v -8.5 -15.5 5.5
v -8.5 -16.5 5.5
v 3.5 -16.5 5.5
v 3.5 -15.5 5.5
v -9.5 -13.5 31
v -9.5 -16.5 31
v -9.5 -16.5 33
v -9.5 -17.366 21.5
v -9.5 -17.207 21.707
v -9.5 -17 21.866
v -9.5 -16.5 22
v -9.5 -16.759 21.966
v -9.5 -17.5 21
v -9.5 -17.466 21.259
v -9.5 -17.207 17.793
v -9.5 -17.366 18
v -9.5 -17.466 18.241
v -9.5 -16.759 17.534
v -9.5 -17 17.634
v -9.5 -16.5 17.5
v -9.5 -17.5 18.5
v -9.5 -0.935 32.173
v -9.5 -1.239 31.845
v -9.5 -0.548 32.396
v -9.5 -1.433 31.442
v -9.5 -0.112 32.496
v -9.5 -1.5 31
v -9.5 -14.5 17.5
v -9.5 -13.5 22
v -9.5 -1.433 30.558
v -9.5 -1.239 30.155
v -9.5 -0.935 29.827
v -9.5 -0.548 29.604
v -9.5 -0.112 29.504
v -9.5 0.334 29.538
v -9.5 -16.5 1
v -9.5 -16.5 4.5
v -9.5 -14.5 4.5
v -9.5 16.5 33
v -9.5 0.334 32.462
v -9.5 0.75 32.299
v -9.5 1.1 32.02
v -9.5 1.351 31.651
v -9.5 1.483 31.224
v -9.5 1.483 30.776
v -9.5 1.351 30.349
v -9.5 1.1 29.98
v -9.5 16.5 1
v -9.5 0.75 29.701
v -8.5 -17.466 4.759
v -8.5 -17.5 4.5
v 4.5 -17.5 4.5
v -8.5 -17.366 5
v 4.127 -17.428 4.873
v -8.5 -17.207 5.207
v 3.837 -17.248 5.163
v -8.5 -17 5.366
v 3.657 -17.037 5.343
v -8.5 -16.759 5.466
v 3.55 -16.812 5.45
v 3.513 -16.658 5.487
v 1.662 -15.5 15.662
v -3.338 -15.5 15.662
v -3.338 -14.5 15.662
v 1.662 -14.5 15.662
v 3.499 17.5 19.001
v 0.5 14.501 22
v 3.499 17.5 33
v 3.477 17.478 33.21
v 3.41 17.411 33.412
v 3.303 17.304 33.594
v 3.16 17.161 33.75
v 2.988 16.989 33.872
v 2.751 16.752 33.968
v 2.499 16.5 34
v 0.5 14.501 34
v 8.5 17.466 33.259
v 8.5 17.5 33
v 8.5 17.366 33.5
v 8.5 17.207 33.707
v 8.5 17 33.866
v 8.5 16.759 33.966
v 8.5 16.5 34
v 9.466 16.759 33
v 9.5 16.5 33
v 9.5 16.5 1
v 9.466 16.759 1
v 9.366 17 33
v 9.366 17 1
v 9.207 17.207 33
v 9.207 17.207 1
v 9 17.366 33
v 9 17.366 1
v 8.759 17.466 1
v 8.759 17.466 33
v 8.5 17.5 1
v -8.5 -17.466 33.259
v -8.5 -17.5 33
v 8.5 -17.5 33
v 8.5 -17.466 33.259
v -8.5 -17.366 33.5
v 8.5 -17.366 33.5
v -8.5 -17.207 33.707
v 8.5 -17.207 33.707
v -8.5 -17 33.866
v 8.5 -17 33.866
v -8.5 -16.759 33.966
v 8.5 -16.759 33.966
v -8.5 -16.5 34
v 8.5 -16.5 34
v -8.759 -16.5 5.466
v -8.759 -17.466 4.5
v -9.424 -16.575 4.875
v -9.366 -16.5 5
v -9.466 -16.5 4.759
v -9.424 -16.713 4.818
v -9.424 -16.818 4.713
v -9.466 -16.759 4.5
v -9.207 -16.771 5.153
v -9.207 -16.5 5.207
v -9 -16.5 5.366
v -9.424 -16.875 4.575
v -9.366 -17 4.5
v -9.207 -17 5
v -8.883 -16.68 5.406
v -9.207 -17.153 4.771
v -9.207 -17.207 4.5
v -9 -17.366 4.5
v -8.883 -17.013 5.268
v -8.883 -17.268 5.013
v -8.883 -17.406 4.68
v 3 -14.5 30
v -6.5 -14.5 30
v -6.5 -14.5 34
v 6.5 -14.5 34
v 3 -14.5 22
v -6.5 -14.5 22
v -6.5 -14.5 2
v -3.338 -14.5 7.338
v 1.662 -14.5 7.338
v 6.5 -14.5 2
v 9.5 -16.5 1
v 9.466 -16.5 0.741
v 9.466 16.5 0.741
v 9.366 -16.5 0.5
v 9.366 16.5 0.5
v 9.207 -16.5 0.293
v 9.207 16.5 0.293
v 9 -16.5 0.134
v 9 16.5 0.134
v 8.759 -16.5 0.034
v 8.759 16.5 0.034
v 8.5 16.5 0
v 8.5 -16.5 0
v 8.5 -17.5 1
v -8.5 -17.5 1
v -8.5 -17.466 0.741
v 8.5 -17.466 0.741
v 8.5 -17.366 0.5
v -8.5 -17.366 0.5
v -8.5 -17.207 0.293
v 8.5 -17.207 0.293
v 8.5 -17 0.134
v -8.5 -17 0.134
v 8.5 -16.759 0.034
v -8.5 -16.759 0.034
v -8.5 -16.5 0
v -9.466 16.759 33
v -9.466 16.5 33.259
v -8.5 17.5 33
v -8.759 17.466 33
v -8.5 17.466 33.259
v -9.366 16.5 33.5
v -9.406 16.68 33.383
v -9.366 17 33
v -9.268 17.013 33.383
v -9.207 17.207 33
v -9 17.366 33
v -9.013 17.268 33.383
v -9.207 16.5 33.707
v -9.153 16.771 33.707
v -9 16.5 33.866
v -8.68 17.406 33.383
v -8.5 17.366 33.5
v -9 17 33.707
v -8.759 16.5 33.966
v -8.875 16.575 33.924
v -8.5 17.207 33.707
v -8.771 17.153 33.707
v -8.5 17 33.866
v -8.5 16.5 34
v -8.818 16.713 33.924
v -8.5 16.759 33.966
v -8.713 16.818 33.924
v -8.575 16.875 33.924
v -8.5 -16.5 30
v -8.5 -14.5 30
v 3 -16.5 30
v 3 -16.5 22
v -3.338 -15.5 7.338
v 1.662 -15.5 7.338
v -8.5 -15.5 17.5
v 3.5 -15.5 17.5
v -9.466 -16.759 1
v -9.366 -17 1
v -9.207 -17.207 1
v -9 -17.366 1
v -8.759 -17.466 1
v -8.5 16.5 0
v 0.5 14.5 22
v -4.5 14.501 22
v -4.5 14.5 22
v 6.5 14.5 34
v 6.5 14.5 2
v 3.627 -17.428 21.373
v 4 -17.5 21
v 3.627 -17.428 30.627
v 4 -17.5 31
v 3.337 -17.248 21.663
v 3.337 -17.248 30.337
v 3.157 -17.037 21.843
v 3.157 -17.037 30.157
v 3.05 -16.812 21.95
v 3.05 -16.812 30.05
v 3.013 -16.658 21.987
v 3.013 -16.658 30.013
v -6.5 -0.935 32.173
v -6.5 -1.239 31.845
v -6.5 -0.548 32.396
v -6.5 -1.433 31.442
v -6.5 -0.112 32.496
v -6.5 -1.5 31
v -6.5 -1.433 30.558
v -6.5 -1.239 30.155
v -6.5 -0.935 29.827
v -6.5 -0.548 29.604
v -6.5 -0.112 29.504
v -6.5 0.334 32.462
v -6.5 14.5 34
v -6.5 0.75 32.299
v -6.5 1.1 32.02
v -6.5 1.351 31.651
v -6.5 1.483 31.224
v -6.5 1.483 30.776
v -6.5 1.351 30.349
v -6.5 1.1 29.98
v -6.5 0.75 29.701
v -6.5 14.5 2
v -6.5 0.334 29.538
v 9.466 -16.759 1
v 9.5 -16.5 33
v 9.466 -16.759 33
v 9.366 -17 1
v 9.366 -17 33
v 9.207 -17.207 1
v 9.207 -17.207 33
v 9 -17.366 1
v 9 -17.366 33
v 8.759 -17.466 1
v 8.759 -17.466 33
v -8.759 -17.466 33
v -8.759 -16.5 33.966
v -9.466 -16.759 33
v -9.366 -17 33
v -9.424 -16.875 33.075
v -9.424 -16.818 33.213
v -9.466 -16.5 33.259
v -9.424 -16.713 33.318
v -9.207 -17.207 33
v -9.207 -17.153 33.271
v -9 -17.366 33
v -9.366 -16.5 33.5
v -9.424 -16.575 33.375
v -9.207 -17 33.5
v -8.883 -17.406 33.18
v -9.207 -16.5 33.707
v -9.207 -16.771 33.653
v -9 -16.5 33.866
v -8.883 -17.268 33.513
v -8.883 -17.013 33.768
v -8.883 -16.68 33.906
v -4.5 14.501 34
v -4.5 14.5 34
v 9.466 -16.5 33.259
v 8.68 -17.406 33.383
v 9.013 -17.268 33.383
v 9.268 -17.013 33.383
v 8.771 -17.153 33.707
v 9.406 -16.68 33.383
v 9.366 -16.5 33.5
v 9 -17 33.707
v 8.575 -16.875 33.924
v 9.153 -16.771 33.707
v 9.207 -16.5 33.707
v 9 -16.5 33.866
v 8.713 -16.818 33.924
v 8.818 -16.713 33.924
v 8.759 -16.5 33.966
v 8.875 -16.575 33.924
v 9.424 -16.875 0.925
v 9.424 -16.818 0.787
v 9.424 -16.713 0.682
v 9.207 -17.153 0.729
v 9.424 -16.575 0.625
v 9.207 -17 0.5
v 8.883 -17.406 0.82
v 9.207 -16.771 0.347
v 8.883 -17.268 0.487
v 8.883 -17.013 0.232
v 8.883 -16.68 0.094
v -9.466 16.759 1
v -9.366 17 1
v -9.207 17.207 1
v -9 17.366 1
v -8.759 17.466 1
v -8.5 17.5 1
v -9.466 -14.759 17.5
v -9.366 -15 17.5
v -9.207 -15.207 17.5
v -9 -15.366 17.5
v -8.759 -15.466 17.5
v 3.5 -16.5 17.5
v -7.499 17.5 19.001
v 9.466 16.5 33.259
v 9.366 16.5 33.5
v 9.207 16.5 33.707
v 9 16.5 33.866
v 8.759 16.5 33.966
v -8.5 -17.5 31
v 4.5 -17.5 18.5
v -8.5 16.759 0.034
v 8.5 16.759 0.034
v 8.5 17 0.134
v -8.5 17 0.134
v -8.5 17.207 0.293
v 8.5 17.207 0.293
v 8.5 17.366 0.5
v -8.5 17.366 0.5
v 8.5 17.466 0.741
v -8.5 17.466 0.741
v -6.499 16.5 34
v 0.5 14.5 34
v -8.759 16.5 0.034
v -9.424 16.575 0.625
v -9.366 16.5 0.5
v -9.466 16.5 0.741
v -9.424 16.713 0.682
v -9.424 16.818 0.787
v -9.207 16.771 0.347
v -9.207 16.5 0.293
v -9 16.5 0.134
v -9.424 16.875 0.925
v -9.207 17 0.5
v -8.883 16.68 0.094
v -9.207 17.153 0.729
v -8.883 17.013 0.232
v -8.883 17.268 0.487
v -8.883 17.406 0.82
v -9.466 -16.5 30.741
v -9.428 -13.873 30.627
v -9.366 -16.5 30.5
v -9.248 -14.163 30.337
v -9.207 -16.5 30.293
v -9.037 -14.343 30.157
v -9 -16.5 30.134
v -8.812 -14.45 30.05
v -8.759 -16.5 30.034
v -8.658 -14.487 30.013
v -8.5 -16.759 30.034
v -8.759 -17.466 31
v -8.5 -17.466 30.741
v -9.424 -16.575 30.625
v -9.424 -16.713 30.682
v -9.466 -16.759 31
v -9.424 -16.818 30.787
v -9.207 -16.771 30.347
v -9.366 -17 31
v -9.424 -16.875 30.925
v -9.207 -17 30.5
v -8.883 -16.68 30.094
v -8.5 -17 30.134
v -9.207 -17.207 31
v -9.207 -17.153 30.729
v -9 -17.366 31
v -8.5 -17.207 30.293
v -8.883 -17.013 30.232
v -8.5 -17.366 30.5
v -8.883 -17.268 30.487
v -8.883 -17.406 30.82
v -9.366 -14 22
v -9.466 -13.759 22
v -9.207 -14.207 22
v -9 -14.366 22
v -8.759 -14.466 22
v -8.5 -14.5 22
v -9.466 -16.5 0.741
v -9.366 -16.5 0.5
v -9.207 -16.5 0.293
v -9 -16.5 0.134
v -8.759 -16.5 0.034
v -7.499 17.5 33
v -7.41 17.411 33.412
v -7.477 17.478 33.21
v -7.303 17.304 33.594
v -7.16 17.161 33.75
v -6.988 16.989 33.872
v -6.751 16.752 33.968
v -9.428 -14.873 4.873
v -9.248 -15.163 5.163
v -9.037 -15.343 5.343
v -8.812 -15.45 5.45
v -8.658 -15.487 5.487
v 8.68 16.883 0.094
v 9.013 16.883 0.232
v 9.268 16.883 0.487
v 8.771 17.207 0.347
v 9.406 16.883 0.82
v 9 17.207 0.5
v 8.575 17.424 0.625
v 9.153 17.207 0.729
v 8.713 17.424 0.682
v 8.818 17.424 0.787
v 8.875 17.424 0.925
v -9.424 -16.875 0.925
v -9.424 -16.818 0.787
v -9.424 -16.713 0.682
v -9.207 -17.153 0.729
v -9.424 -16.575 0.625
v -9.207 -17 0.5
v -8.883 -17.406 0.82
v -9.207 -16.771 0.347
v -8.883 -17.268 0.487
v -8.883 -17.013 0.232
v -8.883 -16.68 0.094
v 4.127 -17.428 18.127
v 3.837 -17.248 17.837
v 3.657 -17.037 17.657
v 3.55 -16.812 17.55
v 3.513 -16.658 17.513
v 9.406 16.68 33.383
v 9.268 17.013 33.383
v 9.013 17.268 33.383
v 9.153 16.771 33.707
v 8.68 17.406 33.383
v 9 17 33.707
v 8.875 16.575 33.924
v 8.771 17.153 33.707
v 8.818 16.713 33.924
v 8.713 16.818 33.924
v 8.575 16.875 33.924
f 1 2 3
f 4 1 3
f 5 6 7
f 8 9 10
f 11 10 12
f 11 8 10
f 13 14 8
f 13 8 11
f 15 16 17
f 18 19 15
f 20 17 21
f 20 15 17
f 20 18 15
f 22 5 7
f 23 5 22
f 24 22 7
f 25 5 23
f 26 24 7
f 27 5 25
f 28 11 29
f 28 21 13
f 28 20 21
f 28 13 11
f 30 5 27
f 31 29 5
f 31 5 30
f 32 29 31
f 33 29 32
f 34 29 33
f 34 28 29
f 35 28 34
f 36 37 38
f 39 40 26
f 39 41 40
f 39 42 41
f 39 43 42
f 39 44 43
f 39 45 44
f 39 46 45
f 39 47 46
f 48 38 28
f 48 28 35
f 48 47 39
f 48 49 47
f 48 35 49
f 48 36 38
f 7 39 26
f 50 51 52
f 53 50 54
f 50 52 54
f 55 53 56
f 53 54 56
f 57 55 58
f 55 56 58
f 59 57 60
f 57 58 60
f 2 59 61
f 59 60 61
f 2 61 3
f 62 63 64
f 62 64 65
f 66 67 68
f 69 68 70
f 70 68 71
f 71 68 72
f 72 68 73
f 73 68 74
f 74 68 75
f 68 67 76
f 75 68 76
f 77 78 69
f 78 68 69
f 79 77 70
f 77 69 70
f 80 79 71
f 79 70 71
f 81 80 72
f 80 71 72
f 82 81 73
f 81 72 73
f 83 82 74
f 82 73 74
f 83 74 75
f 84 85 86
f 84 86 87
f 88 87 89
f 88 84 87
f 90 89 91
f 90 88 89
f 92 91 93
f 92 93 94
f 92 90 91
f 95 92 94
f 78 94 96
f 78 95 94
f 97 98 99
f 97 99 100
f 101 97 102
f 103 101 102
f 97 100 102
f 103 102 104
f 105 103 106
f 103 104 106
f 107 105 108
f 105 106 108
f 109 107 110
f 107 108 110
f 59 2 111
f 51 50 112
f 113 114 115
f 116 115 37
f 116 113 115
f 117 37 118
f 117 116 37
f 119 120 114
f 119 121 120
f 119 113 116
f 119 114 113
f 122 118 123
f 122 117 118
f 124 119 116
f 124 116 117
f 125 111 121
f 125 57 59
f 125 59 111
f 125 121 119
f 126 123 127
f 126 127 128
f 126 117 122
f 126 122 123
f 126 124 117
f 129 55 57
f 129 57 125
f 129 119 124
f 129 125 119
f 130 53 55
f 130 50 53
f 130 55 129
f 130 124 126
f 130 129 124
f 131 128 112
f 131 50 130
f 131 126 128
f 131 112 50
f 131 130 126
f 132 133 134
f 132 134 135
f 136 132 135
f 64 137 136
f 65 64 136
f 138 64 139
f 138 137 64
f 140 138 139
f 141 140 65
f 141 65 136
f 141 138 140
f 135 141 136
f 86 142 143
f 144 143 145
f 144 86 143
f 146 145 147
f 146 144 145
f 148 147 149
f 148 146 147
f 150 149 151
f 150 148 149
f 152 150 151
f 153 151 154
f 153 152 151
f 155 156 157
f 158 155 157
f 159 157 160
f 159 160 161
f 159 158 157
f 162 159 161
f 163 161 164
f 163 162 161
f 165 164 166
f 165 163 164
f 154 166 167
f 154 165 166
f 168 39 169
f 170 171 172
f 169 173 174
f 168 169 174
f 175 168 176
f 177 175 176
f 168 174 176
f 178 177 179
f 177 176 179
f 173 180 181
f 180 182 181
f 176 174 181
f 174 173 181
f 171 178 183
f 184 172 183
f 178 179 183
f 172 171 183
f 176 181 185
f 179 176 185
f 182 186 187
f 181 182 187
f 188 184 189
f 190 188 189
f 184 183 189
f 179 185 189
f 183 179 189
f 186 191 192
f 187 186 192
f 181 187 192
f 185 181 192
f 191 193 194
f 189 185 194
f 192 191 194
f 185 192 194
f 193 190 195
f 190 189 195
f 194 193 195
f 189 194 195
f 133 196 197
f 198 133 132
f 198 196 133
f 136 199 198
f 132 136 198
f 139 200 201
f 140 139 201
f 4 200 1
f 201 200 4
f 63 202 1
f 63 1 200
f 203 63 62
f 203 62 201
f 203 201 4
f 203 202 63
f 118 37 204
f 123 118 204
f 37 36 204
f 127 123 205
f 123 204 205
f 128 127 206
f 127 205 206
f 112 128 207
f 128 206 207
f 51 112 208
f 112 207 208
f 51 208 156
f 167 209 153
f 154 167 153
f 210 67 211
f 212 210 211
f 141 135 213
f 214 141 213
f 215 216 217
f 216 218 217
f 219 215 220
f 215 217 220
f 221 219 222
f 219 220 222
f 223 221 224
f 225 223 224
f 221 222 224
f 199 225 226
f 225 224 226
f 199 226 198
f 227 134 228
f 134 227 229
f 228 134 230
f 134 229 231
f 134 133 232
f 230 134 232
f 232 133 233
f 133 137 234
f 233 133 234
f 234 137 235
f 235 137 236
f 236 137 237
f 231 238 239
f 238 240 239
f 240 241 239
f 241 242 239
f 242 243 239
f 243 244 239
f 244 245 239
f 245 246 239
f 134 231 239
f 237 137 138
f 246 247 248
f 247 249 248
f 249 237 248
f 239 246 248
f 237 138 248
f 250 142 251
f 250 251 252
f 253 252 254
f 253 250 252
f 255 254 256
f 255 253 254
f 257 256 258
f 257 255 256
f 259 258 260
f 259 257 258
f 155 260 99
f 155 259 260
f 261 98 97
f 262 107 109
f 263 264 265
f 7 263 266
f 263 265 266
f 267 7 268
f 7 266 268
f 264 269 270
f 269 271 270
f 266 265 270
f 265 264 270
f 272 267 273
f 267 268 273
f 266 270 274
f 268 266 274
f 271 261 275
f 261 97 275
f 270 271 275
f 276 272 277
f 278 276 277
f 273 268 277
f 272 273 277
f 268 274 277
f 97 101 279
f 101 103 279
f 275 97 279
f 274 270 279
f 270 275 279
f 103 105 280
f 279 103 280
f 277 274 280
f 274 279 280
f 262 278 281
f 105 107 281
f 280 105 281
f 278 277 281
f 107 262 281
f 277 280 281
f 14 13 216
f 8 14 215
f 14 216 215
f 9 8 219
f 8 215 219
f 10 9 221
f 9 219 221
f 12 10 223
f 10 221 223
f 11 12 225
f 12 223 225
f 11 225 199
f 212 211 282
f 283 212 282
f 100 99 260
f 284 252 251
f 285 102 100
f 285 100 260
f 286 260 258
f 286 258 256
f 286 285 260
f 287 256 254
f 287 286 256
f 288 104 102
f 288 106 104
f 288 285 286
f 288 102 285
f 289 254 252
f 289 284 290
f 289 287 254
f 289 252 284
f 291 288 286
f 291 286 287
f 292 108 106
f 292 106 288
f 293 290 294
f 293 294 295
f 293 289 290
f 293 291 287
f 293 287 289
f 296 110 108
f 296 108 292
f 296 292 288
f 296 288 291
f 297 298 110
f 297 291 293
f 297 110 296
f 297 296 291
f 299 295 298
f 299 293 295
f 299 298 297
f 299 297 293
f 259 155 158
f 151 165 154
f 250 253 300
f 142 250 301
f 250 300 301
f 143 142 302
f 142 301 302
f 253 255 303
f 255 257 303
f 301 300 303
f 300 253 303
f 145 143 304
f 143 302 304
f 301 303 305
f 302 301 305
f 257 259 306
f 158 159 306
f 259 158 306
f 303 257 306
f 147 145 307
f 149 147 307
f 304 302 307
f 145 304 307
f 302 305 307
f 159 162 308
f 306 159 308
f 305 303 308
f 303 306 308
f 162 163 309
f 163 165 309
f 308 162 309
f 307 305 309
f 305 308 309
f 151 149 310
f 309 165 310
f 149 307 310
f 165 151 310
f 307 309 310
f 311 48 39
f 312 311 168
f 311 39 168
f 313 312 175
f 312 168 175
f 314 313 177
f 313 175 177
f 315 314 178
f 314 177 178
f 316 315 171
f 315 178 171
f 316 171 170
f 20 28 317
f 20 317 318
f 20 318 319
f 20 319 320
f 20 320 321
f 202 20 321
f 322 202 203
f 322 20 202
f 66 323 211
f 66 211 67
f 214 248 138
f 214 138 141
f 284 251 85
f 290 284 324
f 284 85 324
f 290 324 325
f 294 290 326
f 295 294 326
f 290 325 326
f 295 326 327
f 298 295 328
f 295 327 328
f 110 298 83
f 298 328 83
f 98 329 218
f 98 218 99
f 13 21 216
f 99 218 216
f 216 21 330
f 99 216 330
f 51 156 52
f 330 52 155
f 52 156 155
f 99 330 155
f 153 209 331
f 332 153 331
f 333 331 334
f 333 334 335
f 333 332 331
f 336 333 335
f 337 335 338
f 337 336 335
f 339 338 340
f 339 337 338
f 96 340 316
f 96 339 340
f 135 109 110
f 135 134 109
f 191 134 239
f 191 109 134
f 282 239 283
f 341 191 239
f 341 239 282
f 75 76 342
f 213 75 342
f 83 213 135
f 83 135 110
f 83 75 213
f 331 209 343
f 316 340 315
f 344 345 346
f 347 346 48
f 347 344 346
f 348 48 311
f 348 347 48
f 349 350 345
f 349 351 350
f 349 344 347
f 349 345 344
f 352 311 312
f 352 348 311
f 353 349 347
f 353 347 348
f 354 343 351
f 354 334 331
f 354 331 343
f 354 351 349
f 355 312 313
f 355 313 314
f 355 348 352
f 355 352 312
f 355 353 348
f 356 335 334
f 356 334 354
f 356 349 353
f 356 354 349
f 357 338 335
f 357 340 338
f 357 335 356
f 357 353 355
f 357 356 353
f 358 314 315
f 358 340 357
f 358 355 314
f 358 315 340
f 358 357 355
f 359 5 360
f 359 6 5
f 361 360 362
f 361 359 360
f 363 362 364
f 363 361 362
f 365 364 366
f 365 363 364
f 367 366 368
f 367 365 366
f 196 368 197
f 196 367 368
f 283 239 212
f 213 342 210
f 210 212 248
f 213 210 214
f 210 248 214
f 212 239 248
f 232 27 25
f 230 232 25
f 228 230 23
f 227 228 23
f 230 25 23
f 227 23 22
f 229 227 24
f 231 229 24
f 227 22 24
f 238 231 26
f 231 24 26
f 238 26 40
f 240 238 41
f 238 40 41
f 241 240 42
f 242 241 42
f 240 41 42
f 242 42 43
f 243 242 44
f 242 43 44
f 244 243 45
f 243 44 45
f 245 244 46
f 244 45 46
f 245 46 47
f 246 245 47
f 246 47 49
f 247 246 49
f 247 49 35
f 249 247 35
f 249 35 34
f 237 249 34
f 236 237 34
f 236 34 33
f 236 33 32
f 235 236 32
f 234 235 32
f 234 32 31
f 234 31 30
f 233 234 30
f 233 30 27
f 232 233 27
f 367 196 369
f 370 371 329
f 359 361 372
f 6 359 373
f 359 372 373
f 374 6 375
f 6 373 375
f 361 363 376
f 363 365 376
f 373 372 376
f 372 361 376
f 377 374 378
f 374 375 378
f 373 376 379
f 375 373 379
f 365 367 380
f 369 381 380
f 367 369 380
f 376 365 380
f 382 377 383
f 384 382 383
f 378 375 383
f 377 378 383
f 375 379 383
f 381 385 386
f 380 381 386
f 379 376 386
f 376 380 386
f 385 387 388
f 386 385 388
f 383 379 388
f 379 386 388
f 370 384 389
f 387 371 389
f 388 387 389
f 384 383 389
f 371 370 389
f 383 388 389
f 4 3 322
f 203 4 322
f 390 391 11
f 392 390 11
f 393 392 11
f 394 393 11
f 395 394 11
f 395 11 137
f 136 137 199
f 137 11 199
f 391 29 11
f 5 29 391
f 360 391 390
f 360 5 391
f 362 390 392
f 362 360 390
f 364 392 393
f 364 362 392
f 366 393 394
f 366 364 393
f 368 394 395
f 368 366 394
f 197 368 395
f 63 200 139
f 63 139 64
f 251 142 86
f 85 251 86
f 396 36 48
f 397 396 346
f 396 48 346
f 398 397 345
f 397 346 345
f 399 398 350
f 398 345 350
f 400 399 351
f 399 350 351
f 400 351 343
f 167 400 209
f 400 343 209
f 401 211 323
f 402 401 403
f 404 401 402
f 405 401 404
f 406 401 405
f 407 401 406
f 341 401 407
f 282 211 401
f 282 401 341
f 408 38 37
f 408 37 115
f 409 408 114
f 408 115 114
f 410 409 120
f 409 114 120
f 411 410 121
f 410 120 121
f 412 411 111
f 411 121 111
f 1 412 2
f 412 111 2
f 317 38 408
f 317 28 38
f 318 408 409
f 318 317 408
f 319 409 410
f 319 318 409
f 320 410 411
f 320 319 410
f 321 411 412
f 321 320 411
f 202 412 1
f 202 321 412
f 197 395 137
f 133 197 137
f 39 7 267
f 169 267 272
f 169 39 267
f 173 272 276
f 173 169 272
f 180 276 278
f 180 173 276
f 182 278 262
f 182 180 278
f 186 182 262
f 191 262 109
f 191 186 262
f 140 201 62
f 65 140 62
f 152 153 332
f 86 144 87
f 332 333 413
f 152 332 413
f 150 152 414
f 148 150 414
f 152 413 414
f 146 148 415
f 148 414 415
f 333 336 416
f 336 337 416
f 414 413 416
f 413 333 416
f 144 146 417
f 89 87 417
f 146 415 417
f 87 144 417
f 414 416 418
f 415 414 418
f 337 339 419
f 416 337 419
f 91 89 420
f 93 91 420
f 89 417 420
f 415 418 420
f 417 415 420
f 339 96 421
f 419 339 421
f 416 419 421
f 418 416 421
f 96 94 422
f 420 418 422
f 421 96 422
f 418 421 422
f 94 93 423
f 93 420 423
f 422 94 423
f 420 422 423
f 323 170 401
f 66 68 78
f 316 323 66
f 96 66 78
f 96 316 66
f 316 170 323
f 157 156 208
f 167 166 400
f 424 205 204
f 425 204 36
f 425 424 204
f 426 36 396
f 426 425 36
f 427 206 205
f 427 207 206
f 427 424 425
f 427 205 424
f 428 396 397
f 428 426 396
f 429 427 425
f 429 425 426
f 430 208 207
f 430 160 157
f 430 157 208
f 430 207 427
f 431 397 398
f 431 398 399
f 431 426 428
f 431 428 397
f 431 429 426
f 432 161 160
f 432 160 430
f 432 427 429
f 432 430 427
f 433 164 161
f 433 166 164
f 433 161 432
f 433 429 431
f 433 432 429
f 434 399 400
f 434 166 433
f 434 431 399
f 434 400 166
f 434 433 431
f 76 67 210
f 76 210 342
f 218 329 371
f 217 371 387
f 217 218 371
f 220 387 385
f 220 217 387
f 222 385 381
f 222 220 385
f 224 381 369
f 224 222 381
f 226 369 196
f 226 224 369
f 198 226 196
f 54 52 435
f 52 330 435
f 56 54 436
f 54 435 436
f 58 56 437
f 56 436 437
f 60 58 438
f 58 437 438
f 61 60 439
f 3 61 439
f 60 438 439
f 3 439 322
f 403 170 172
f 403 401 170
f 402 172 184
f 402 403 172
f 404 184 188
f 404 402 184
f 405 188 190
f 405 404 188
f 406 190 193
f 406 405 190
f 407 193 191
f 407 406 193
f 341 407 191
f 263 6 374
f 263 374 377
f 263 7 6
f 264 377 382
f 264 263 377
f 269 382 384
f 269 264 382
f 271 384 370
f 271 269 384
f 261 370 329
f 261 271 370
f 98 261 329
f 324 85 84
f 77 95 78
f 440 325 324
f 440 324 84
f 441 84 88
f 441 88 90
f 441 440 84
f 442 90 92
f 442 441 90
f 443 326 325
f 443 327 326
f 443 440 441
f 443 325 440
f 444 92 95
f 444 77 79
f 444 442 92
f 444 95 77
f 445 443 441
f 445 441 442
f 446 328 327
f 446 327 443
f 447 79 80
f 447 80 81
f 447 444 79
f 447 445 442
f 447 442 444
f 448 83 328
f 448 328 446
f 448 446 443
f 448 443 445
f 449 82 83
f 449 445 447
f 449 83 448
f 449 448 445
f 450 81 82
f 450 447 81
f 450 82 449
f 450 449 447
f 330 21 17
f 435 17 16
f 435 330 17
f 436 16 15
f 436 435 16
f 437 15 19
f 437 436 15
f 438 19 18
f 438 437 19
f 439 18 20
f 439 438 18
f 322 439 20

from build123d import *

# Parameters (mm, degrees)
SKETCH_W        = 19
SKETCH_H        = 35
PAD_DEPTH       = 2
SKETCH001_W     = 19
SKETCH001_H     = 35
SKETCH001_W_2   = 13
SKETCH001_H_2   = 29
PAD001_DEPTH    = 32
SKETCH002_W     = 12.5
SKETCH002_H     = 8
POCKET_DEPTH    = 3
FILLET_R        = 1
SKETCH003_W     = 13
SKETCH003_H     = 12
POCKET001_DEPTH = 2
SKETCH004_W     = 5
SKETCH004_H     = 8.323044
POCKET002_DEPTH = 1
SKETCH005_W     = 5
SKETCH005_H     = 12
POCKET003_DEPTH = 3
CHAMFER_SIZE    = 2.999
FILLET001_R     = 1
FILLET002_R     = 1
FILLET003_R     = 1
FILLET004_R     = 1
FILLET005_R     = 1
FILLET006_R     = 1
FILLET007_R     = 1
FILLET008_R     = 1
FILLET009_R     = 1
CHAMFER001_SIZE = 2.999
SKETCH006_R     = 1.5
POCKET004_DEPTH = 5


with BuildPart() as part:
    # Sketch → Pad (new body)
    with BuildSketch(Plane.XY):
        Rectangle(SKETCH_W, SKETCH_H)
    extrude(amount=PAD_DEPTH)

    # Sketch001 (on Face6 of Pad) → Pad001 (join)
    with BuildSketch(Plane.XY.offset(2)):
        Rectangle(SKETCH001_W, SKETCH001_H)
        Rectangle(SKETCH001_W_2, SKETCH001_H_2, mode=Mode.SUBTRACT)
    extrude(amount=PAD001_DEPTH)

    # Sketch002 (on Face10 of Pad001) → Pocket (cut)
    with BuildSketch(Plane.XZ.offset(17.5)):
        with Locations((-3.25, 26)):
            Rectangle(SKETCH002_W, SKETCH002_H)
    extrude(amount=-POCKET_DEPTH, mode=Mode.SUBTRACT)

    # Fillet
    fillet_edges = [part.edges().sort_by_distance(p)[0] for p in [
        (3, -17.5, 26),
        (-3.25, -17.5, 30),
        (-3.25, -17.5, 22),
    ]]
    fillet(fillet_edges, radius=FILLET_R)

    # Sketch003 (on Face2 of Fillet) → Pocket001 (cut)
    with BuildSketch(Plane.XZ.offset(17.5)):
        with Locations((-3, 11.5)):
            Rectangle(SKETCH003_W, SKETCH003_H)
    extrude(amount=-POCKET001_DEPTH, mode=Mode.SUBTRACT)

    # Sketch004 (on Face9 of Pocket001) → Pocket002 (cut)
    with BuildSketch(Plane.XZ.offset(15.5)):
        with Locations((-0.838478, 11.5)):
            Rectangle(SKETCH004_W, SKETCH004_H)
    extrude(amount=-POCKET002_DEPTH, mode=Mode.SUBTRACT)

    # Sketch005 (on Face12 of Pocket002) → Pocket003 (cut)
    with BuildSketch(Plane(origin=(0, 17.5, 0), x_dir=(-1, 0, 0), z_dir=(0, 1, 0))):
        with Locations((2, 28)):
            Rectangle(SKETCH005_W, SKETCH005_H)
    extrude(amount=-POCKET003_DEPTH, mode=Mode.SUBTRACT)

    # Chamfer
    chamfer_edges = [part.edges().sort_by_distance(p)[0] for p in [
        (0.5, 17.5, 28),
        (-4.5, 17.5, 28),
    ]]
    chamfer(chamfer_edges, length=CHAMFER_SIZE)

    # Fillet001
    fillet001_edges = [part.edges().sort_by_distance(p)[0] for p in [
        (-3, -17.5, 17.5),
        (3.5, -17.5, 11.5),
        (-3, -17.5, 5.5),
    ]]
    fillet(fillet001_edges, radius=FILLET001_R)

    # Fillet002
    fillet002_edges = [part.edges().sort_by_distance(p)[0] for p in [
        (0, -17.5, 0),
    ]]
    fillet(fillet002_edges, radius=FILLET002_R)

    # Fillet003
    fillet003_edges = [part.edges().sort_by_distance(p)[0] for p in [
        (9.5, 0.5, 0),
    ]]
    fillet(fillet003_edges, radius=FILLET003_R)

    # Fillet004
    fillet004_edges = [part.edges().sort_by_distance(p)[0] for p in [
        (-0.5, 17.5, 0),
    ]]
    fillet(fillet004_edges, radius=FILLET004_R)

    # Fillet005
    fillet005_edges = [part.edges().sort_by_distance(p)[0] for p in [
        (-9.5, 0, 0),
    ]]
    fillet(fillet005_edges, radius=FILLET005_R)

    # Fillet006
    fillet006_edges = [part.edges().sort_by_distance(p)[0] for p in [
        (-0.5, -17.5, 34),
    ]]
    fillet(fillet006_edges, radius=FILLET006_R)

    # Fillet007
    fillet007_edges = [part.edges().sort_by_distance(p)[0] for p in [
        (-9.5, 0, 34),
    ]]
    fillet(fillet007_edges, radius=FILLET007_R)

    # Fillet008
    fillet008_edges = [part.edges().sort_by_distance(p)[0] for p in [
        (-9.5, -15.5, 11.5),
    ]]
    fillet(fillet008_edges, radius=FILLET008_R)

    # Fillet009
    fillet009_edges = [part.edges().sort_by_distance(p)[0] for p in [
        (-9.5, -14.5, 26),
    ]]
    fillet(fillet009_edges, radius=FILLET009_R)

    # Chamfer001
    chamfer001_edges = [part.edges().sort_by_distance(p)[0] for p in [
        (-2, 17.5, 22),
    ]]
    chamfer(chamfer001_edges, length=CHAMFER001_SIZE)

    # Sketch006 (on Face16 of Chamfer001) → Pocket004 (cut)
    with BuildSketch(Plane(origin=(-9.5, 0, 0), x_dir=(0, -1, 0), z_dir=(-1, 0, 0))):
        with Locations((0, 31)):
            Circle(SKETCH006_R)
    extrude(amount=-POCKET004_DEPTH, mode=Mode.SUBTRACT)


solid = part.part
